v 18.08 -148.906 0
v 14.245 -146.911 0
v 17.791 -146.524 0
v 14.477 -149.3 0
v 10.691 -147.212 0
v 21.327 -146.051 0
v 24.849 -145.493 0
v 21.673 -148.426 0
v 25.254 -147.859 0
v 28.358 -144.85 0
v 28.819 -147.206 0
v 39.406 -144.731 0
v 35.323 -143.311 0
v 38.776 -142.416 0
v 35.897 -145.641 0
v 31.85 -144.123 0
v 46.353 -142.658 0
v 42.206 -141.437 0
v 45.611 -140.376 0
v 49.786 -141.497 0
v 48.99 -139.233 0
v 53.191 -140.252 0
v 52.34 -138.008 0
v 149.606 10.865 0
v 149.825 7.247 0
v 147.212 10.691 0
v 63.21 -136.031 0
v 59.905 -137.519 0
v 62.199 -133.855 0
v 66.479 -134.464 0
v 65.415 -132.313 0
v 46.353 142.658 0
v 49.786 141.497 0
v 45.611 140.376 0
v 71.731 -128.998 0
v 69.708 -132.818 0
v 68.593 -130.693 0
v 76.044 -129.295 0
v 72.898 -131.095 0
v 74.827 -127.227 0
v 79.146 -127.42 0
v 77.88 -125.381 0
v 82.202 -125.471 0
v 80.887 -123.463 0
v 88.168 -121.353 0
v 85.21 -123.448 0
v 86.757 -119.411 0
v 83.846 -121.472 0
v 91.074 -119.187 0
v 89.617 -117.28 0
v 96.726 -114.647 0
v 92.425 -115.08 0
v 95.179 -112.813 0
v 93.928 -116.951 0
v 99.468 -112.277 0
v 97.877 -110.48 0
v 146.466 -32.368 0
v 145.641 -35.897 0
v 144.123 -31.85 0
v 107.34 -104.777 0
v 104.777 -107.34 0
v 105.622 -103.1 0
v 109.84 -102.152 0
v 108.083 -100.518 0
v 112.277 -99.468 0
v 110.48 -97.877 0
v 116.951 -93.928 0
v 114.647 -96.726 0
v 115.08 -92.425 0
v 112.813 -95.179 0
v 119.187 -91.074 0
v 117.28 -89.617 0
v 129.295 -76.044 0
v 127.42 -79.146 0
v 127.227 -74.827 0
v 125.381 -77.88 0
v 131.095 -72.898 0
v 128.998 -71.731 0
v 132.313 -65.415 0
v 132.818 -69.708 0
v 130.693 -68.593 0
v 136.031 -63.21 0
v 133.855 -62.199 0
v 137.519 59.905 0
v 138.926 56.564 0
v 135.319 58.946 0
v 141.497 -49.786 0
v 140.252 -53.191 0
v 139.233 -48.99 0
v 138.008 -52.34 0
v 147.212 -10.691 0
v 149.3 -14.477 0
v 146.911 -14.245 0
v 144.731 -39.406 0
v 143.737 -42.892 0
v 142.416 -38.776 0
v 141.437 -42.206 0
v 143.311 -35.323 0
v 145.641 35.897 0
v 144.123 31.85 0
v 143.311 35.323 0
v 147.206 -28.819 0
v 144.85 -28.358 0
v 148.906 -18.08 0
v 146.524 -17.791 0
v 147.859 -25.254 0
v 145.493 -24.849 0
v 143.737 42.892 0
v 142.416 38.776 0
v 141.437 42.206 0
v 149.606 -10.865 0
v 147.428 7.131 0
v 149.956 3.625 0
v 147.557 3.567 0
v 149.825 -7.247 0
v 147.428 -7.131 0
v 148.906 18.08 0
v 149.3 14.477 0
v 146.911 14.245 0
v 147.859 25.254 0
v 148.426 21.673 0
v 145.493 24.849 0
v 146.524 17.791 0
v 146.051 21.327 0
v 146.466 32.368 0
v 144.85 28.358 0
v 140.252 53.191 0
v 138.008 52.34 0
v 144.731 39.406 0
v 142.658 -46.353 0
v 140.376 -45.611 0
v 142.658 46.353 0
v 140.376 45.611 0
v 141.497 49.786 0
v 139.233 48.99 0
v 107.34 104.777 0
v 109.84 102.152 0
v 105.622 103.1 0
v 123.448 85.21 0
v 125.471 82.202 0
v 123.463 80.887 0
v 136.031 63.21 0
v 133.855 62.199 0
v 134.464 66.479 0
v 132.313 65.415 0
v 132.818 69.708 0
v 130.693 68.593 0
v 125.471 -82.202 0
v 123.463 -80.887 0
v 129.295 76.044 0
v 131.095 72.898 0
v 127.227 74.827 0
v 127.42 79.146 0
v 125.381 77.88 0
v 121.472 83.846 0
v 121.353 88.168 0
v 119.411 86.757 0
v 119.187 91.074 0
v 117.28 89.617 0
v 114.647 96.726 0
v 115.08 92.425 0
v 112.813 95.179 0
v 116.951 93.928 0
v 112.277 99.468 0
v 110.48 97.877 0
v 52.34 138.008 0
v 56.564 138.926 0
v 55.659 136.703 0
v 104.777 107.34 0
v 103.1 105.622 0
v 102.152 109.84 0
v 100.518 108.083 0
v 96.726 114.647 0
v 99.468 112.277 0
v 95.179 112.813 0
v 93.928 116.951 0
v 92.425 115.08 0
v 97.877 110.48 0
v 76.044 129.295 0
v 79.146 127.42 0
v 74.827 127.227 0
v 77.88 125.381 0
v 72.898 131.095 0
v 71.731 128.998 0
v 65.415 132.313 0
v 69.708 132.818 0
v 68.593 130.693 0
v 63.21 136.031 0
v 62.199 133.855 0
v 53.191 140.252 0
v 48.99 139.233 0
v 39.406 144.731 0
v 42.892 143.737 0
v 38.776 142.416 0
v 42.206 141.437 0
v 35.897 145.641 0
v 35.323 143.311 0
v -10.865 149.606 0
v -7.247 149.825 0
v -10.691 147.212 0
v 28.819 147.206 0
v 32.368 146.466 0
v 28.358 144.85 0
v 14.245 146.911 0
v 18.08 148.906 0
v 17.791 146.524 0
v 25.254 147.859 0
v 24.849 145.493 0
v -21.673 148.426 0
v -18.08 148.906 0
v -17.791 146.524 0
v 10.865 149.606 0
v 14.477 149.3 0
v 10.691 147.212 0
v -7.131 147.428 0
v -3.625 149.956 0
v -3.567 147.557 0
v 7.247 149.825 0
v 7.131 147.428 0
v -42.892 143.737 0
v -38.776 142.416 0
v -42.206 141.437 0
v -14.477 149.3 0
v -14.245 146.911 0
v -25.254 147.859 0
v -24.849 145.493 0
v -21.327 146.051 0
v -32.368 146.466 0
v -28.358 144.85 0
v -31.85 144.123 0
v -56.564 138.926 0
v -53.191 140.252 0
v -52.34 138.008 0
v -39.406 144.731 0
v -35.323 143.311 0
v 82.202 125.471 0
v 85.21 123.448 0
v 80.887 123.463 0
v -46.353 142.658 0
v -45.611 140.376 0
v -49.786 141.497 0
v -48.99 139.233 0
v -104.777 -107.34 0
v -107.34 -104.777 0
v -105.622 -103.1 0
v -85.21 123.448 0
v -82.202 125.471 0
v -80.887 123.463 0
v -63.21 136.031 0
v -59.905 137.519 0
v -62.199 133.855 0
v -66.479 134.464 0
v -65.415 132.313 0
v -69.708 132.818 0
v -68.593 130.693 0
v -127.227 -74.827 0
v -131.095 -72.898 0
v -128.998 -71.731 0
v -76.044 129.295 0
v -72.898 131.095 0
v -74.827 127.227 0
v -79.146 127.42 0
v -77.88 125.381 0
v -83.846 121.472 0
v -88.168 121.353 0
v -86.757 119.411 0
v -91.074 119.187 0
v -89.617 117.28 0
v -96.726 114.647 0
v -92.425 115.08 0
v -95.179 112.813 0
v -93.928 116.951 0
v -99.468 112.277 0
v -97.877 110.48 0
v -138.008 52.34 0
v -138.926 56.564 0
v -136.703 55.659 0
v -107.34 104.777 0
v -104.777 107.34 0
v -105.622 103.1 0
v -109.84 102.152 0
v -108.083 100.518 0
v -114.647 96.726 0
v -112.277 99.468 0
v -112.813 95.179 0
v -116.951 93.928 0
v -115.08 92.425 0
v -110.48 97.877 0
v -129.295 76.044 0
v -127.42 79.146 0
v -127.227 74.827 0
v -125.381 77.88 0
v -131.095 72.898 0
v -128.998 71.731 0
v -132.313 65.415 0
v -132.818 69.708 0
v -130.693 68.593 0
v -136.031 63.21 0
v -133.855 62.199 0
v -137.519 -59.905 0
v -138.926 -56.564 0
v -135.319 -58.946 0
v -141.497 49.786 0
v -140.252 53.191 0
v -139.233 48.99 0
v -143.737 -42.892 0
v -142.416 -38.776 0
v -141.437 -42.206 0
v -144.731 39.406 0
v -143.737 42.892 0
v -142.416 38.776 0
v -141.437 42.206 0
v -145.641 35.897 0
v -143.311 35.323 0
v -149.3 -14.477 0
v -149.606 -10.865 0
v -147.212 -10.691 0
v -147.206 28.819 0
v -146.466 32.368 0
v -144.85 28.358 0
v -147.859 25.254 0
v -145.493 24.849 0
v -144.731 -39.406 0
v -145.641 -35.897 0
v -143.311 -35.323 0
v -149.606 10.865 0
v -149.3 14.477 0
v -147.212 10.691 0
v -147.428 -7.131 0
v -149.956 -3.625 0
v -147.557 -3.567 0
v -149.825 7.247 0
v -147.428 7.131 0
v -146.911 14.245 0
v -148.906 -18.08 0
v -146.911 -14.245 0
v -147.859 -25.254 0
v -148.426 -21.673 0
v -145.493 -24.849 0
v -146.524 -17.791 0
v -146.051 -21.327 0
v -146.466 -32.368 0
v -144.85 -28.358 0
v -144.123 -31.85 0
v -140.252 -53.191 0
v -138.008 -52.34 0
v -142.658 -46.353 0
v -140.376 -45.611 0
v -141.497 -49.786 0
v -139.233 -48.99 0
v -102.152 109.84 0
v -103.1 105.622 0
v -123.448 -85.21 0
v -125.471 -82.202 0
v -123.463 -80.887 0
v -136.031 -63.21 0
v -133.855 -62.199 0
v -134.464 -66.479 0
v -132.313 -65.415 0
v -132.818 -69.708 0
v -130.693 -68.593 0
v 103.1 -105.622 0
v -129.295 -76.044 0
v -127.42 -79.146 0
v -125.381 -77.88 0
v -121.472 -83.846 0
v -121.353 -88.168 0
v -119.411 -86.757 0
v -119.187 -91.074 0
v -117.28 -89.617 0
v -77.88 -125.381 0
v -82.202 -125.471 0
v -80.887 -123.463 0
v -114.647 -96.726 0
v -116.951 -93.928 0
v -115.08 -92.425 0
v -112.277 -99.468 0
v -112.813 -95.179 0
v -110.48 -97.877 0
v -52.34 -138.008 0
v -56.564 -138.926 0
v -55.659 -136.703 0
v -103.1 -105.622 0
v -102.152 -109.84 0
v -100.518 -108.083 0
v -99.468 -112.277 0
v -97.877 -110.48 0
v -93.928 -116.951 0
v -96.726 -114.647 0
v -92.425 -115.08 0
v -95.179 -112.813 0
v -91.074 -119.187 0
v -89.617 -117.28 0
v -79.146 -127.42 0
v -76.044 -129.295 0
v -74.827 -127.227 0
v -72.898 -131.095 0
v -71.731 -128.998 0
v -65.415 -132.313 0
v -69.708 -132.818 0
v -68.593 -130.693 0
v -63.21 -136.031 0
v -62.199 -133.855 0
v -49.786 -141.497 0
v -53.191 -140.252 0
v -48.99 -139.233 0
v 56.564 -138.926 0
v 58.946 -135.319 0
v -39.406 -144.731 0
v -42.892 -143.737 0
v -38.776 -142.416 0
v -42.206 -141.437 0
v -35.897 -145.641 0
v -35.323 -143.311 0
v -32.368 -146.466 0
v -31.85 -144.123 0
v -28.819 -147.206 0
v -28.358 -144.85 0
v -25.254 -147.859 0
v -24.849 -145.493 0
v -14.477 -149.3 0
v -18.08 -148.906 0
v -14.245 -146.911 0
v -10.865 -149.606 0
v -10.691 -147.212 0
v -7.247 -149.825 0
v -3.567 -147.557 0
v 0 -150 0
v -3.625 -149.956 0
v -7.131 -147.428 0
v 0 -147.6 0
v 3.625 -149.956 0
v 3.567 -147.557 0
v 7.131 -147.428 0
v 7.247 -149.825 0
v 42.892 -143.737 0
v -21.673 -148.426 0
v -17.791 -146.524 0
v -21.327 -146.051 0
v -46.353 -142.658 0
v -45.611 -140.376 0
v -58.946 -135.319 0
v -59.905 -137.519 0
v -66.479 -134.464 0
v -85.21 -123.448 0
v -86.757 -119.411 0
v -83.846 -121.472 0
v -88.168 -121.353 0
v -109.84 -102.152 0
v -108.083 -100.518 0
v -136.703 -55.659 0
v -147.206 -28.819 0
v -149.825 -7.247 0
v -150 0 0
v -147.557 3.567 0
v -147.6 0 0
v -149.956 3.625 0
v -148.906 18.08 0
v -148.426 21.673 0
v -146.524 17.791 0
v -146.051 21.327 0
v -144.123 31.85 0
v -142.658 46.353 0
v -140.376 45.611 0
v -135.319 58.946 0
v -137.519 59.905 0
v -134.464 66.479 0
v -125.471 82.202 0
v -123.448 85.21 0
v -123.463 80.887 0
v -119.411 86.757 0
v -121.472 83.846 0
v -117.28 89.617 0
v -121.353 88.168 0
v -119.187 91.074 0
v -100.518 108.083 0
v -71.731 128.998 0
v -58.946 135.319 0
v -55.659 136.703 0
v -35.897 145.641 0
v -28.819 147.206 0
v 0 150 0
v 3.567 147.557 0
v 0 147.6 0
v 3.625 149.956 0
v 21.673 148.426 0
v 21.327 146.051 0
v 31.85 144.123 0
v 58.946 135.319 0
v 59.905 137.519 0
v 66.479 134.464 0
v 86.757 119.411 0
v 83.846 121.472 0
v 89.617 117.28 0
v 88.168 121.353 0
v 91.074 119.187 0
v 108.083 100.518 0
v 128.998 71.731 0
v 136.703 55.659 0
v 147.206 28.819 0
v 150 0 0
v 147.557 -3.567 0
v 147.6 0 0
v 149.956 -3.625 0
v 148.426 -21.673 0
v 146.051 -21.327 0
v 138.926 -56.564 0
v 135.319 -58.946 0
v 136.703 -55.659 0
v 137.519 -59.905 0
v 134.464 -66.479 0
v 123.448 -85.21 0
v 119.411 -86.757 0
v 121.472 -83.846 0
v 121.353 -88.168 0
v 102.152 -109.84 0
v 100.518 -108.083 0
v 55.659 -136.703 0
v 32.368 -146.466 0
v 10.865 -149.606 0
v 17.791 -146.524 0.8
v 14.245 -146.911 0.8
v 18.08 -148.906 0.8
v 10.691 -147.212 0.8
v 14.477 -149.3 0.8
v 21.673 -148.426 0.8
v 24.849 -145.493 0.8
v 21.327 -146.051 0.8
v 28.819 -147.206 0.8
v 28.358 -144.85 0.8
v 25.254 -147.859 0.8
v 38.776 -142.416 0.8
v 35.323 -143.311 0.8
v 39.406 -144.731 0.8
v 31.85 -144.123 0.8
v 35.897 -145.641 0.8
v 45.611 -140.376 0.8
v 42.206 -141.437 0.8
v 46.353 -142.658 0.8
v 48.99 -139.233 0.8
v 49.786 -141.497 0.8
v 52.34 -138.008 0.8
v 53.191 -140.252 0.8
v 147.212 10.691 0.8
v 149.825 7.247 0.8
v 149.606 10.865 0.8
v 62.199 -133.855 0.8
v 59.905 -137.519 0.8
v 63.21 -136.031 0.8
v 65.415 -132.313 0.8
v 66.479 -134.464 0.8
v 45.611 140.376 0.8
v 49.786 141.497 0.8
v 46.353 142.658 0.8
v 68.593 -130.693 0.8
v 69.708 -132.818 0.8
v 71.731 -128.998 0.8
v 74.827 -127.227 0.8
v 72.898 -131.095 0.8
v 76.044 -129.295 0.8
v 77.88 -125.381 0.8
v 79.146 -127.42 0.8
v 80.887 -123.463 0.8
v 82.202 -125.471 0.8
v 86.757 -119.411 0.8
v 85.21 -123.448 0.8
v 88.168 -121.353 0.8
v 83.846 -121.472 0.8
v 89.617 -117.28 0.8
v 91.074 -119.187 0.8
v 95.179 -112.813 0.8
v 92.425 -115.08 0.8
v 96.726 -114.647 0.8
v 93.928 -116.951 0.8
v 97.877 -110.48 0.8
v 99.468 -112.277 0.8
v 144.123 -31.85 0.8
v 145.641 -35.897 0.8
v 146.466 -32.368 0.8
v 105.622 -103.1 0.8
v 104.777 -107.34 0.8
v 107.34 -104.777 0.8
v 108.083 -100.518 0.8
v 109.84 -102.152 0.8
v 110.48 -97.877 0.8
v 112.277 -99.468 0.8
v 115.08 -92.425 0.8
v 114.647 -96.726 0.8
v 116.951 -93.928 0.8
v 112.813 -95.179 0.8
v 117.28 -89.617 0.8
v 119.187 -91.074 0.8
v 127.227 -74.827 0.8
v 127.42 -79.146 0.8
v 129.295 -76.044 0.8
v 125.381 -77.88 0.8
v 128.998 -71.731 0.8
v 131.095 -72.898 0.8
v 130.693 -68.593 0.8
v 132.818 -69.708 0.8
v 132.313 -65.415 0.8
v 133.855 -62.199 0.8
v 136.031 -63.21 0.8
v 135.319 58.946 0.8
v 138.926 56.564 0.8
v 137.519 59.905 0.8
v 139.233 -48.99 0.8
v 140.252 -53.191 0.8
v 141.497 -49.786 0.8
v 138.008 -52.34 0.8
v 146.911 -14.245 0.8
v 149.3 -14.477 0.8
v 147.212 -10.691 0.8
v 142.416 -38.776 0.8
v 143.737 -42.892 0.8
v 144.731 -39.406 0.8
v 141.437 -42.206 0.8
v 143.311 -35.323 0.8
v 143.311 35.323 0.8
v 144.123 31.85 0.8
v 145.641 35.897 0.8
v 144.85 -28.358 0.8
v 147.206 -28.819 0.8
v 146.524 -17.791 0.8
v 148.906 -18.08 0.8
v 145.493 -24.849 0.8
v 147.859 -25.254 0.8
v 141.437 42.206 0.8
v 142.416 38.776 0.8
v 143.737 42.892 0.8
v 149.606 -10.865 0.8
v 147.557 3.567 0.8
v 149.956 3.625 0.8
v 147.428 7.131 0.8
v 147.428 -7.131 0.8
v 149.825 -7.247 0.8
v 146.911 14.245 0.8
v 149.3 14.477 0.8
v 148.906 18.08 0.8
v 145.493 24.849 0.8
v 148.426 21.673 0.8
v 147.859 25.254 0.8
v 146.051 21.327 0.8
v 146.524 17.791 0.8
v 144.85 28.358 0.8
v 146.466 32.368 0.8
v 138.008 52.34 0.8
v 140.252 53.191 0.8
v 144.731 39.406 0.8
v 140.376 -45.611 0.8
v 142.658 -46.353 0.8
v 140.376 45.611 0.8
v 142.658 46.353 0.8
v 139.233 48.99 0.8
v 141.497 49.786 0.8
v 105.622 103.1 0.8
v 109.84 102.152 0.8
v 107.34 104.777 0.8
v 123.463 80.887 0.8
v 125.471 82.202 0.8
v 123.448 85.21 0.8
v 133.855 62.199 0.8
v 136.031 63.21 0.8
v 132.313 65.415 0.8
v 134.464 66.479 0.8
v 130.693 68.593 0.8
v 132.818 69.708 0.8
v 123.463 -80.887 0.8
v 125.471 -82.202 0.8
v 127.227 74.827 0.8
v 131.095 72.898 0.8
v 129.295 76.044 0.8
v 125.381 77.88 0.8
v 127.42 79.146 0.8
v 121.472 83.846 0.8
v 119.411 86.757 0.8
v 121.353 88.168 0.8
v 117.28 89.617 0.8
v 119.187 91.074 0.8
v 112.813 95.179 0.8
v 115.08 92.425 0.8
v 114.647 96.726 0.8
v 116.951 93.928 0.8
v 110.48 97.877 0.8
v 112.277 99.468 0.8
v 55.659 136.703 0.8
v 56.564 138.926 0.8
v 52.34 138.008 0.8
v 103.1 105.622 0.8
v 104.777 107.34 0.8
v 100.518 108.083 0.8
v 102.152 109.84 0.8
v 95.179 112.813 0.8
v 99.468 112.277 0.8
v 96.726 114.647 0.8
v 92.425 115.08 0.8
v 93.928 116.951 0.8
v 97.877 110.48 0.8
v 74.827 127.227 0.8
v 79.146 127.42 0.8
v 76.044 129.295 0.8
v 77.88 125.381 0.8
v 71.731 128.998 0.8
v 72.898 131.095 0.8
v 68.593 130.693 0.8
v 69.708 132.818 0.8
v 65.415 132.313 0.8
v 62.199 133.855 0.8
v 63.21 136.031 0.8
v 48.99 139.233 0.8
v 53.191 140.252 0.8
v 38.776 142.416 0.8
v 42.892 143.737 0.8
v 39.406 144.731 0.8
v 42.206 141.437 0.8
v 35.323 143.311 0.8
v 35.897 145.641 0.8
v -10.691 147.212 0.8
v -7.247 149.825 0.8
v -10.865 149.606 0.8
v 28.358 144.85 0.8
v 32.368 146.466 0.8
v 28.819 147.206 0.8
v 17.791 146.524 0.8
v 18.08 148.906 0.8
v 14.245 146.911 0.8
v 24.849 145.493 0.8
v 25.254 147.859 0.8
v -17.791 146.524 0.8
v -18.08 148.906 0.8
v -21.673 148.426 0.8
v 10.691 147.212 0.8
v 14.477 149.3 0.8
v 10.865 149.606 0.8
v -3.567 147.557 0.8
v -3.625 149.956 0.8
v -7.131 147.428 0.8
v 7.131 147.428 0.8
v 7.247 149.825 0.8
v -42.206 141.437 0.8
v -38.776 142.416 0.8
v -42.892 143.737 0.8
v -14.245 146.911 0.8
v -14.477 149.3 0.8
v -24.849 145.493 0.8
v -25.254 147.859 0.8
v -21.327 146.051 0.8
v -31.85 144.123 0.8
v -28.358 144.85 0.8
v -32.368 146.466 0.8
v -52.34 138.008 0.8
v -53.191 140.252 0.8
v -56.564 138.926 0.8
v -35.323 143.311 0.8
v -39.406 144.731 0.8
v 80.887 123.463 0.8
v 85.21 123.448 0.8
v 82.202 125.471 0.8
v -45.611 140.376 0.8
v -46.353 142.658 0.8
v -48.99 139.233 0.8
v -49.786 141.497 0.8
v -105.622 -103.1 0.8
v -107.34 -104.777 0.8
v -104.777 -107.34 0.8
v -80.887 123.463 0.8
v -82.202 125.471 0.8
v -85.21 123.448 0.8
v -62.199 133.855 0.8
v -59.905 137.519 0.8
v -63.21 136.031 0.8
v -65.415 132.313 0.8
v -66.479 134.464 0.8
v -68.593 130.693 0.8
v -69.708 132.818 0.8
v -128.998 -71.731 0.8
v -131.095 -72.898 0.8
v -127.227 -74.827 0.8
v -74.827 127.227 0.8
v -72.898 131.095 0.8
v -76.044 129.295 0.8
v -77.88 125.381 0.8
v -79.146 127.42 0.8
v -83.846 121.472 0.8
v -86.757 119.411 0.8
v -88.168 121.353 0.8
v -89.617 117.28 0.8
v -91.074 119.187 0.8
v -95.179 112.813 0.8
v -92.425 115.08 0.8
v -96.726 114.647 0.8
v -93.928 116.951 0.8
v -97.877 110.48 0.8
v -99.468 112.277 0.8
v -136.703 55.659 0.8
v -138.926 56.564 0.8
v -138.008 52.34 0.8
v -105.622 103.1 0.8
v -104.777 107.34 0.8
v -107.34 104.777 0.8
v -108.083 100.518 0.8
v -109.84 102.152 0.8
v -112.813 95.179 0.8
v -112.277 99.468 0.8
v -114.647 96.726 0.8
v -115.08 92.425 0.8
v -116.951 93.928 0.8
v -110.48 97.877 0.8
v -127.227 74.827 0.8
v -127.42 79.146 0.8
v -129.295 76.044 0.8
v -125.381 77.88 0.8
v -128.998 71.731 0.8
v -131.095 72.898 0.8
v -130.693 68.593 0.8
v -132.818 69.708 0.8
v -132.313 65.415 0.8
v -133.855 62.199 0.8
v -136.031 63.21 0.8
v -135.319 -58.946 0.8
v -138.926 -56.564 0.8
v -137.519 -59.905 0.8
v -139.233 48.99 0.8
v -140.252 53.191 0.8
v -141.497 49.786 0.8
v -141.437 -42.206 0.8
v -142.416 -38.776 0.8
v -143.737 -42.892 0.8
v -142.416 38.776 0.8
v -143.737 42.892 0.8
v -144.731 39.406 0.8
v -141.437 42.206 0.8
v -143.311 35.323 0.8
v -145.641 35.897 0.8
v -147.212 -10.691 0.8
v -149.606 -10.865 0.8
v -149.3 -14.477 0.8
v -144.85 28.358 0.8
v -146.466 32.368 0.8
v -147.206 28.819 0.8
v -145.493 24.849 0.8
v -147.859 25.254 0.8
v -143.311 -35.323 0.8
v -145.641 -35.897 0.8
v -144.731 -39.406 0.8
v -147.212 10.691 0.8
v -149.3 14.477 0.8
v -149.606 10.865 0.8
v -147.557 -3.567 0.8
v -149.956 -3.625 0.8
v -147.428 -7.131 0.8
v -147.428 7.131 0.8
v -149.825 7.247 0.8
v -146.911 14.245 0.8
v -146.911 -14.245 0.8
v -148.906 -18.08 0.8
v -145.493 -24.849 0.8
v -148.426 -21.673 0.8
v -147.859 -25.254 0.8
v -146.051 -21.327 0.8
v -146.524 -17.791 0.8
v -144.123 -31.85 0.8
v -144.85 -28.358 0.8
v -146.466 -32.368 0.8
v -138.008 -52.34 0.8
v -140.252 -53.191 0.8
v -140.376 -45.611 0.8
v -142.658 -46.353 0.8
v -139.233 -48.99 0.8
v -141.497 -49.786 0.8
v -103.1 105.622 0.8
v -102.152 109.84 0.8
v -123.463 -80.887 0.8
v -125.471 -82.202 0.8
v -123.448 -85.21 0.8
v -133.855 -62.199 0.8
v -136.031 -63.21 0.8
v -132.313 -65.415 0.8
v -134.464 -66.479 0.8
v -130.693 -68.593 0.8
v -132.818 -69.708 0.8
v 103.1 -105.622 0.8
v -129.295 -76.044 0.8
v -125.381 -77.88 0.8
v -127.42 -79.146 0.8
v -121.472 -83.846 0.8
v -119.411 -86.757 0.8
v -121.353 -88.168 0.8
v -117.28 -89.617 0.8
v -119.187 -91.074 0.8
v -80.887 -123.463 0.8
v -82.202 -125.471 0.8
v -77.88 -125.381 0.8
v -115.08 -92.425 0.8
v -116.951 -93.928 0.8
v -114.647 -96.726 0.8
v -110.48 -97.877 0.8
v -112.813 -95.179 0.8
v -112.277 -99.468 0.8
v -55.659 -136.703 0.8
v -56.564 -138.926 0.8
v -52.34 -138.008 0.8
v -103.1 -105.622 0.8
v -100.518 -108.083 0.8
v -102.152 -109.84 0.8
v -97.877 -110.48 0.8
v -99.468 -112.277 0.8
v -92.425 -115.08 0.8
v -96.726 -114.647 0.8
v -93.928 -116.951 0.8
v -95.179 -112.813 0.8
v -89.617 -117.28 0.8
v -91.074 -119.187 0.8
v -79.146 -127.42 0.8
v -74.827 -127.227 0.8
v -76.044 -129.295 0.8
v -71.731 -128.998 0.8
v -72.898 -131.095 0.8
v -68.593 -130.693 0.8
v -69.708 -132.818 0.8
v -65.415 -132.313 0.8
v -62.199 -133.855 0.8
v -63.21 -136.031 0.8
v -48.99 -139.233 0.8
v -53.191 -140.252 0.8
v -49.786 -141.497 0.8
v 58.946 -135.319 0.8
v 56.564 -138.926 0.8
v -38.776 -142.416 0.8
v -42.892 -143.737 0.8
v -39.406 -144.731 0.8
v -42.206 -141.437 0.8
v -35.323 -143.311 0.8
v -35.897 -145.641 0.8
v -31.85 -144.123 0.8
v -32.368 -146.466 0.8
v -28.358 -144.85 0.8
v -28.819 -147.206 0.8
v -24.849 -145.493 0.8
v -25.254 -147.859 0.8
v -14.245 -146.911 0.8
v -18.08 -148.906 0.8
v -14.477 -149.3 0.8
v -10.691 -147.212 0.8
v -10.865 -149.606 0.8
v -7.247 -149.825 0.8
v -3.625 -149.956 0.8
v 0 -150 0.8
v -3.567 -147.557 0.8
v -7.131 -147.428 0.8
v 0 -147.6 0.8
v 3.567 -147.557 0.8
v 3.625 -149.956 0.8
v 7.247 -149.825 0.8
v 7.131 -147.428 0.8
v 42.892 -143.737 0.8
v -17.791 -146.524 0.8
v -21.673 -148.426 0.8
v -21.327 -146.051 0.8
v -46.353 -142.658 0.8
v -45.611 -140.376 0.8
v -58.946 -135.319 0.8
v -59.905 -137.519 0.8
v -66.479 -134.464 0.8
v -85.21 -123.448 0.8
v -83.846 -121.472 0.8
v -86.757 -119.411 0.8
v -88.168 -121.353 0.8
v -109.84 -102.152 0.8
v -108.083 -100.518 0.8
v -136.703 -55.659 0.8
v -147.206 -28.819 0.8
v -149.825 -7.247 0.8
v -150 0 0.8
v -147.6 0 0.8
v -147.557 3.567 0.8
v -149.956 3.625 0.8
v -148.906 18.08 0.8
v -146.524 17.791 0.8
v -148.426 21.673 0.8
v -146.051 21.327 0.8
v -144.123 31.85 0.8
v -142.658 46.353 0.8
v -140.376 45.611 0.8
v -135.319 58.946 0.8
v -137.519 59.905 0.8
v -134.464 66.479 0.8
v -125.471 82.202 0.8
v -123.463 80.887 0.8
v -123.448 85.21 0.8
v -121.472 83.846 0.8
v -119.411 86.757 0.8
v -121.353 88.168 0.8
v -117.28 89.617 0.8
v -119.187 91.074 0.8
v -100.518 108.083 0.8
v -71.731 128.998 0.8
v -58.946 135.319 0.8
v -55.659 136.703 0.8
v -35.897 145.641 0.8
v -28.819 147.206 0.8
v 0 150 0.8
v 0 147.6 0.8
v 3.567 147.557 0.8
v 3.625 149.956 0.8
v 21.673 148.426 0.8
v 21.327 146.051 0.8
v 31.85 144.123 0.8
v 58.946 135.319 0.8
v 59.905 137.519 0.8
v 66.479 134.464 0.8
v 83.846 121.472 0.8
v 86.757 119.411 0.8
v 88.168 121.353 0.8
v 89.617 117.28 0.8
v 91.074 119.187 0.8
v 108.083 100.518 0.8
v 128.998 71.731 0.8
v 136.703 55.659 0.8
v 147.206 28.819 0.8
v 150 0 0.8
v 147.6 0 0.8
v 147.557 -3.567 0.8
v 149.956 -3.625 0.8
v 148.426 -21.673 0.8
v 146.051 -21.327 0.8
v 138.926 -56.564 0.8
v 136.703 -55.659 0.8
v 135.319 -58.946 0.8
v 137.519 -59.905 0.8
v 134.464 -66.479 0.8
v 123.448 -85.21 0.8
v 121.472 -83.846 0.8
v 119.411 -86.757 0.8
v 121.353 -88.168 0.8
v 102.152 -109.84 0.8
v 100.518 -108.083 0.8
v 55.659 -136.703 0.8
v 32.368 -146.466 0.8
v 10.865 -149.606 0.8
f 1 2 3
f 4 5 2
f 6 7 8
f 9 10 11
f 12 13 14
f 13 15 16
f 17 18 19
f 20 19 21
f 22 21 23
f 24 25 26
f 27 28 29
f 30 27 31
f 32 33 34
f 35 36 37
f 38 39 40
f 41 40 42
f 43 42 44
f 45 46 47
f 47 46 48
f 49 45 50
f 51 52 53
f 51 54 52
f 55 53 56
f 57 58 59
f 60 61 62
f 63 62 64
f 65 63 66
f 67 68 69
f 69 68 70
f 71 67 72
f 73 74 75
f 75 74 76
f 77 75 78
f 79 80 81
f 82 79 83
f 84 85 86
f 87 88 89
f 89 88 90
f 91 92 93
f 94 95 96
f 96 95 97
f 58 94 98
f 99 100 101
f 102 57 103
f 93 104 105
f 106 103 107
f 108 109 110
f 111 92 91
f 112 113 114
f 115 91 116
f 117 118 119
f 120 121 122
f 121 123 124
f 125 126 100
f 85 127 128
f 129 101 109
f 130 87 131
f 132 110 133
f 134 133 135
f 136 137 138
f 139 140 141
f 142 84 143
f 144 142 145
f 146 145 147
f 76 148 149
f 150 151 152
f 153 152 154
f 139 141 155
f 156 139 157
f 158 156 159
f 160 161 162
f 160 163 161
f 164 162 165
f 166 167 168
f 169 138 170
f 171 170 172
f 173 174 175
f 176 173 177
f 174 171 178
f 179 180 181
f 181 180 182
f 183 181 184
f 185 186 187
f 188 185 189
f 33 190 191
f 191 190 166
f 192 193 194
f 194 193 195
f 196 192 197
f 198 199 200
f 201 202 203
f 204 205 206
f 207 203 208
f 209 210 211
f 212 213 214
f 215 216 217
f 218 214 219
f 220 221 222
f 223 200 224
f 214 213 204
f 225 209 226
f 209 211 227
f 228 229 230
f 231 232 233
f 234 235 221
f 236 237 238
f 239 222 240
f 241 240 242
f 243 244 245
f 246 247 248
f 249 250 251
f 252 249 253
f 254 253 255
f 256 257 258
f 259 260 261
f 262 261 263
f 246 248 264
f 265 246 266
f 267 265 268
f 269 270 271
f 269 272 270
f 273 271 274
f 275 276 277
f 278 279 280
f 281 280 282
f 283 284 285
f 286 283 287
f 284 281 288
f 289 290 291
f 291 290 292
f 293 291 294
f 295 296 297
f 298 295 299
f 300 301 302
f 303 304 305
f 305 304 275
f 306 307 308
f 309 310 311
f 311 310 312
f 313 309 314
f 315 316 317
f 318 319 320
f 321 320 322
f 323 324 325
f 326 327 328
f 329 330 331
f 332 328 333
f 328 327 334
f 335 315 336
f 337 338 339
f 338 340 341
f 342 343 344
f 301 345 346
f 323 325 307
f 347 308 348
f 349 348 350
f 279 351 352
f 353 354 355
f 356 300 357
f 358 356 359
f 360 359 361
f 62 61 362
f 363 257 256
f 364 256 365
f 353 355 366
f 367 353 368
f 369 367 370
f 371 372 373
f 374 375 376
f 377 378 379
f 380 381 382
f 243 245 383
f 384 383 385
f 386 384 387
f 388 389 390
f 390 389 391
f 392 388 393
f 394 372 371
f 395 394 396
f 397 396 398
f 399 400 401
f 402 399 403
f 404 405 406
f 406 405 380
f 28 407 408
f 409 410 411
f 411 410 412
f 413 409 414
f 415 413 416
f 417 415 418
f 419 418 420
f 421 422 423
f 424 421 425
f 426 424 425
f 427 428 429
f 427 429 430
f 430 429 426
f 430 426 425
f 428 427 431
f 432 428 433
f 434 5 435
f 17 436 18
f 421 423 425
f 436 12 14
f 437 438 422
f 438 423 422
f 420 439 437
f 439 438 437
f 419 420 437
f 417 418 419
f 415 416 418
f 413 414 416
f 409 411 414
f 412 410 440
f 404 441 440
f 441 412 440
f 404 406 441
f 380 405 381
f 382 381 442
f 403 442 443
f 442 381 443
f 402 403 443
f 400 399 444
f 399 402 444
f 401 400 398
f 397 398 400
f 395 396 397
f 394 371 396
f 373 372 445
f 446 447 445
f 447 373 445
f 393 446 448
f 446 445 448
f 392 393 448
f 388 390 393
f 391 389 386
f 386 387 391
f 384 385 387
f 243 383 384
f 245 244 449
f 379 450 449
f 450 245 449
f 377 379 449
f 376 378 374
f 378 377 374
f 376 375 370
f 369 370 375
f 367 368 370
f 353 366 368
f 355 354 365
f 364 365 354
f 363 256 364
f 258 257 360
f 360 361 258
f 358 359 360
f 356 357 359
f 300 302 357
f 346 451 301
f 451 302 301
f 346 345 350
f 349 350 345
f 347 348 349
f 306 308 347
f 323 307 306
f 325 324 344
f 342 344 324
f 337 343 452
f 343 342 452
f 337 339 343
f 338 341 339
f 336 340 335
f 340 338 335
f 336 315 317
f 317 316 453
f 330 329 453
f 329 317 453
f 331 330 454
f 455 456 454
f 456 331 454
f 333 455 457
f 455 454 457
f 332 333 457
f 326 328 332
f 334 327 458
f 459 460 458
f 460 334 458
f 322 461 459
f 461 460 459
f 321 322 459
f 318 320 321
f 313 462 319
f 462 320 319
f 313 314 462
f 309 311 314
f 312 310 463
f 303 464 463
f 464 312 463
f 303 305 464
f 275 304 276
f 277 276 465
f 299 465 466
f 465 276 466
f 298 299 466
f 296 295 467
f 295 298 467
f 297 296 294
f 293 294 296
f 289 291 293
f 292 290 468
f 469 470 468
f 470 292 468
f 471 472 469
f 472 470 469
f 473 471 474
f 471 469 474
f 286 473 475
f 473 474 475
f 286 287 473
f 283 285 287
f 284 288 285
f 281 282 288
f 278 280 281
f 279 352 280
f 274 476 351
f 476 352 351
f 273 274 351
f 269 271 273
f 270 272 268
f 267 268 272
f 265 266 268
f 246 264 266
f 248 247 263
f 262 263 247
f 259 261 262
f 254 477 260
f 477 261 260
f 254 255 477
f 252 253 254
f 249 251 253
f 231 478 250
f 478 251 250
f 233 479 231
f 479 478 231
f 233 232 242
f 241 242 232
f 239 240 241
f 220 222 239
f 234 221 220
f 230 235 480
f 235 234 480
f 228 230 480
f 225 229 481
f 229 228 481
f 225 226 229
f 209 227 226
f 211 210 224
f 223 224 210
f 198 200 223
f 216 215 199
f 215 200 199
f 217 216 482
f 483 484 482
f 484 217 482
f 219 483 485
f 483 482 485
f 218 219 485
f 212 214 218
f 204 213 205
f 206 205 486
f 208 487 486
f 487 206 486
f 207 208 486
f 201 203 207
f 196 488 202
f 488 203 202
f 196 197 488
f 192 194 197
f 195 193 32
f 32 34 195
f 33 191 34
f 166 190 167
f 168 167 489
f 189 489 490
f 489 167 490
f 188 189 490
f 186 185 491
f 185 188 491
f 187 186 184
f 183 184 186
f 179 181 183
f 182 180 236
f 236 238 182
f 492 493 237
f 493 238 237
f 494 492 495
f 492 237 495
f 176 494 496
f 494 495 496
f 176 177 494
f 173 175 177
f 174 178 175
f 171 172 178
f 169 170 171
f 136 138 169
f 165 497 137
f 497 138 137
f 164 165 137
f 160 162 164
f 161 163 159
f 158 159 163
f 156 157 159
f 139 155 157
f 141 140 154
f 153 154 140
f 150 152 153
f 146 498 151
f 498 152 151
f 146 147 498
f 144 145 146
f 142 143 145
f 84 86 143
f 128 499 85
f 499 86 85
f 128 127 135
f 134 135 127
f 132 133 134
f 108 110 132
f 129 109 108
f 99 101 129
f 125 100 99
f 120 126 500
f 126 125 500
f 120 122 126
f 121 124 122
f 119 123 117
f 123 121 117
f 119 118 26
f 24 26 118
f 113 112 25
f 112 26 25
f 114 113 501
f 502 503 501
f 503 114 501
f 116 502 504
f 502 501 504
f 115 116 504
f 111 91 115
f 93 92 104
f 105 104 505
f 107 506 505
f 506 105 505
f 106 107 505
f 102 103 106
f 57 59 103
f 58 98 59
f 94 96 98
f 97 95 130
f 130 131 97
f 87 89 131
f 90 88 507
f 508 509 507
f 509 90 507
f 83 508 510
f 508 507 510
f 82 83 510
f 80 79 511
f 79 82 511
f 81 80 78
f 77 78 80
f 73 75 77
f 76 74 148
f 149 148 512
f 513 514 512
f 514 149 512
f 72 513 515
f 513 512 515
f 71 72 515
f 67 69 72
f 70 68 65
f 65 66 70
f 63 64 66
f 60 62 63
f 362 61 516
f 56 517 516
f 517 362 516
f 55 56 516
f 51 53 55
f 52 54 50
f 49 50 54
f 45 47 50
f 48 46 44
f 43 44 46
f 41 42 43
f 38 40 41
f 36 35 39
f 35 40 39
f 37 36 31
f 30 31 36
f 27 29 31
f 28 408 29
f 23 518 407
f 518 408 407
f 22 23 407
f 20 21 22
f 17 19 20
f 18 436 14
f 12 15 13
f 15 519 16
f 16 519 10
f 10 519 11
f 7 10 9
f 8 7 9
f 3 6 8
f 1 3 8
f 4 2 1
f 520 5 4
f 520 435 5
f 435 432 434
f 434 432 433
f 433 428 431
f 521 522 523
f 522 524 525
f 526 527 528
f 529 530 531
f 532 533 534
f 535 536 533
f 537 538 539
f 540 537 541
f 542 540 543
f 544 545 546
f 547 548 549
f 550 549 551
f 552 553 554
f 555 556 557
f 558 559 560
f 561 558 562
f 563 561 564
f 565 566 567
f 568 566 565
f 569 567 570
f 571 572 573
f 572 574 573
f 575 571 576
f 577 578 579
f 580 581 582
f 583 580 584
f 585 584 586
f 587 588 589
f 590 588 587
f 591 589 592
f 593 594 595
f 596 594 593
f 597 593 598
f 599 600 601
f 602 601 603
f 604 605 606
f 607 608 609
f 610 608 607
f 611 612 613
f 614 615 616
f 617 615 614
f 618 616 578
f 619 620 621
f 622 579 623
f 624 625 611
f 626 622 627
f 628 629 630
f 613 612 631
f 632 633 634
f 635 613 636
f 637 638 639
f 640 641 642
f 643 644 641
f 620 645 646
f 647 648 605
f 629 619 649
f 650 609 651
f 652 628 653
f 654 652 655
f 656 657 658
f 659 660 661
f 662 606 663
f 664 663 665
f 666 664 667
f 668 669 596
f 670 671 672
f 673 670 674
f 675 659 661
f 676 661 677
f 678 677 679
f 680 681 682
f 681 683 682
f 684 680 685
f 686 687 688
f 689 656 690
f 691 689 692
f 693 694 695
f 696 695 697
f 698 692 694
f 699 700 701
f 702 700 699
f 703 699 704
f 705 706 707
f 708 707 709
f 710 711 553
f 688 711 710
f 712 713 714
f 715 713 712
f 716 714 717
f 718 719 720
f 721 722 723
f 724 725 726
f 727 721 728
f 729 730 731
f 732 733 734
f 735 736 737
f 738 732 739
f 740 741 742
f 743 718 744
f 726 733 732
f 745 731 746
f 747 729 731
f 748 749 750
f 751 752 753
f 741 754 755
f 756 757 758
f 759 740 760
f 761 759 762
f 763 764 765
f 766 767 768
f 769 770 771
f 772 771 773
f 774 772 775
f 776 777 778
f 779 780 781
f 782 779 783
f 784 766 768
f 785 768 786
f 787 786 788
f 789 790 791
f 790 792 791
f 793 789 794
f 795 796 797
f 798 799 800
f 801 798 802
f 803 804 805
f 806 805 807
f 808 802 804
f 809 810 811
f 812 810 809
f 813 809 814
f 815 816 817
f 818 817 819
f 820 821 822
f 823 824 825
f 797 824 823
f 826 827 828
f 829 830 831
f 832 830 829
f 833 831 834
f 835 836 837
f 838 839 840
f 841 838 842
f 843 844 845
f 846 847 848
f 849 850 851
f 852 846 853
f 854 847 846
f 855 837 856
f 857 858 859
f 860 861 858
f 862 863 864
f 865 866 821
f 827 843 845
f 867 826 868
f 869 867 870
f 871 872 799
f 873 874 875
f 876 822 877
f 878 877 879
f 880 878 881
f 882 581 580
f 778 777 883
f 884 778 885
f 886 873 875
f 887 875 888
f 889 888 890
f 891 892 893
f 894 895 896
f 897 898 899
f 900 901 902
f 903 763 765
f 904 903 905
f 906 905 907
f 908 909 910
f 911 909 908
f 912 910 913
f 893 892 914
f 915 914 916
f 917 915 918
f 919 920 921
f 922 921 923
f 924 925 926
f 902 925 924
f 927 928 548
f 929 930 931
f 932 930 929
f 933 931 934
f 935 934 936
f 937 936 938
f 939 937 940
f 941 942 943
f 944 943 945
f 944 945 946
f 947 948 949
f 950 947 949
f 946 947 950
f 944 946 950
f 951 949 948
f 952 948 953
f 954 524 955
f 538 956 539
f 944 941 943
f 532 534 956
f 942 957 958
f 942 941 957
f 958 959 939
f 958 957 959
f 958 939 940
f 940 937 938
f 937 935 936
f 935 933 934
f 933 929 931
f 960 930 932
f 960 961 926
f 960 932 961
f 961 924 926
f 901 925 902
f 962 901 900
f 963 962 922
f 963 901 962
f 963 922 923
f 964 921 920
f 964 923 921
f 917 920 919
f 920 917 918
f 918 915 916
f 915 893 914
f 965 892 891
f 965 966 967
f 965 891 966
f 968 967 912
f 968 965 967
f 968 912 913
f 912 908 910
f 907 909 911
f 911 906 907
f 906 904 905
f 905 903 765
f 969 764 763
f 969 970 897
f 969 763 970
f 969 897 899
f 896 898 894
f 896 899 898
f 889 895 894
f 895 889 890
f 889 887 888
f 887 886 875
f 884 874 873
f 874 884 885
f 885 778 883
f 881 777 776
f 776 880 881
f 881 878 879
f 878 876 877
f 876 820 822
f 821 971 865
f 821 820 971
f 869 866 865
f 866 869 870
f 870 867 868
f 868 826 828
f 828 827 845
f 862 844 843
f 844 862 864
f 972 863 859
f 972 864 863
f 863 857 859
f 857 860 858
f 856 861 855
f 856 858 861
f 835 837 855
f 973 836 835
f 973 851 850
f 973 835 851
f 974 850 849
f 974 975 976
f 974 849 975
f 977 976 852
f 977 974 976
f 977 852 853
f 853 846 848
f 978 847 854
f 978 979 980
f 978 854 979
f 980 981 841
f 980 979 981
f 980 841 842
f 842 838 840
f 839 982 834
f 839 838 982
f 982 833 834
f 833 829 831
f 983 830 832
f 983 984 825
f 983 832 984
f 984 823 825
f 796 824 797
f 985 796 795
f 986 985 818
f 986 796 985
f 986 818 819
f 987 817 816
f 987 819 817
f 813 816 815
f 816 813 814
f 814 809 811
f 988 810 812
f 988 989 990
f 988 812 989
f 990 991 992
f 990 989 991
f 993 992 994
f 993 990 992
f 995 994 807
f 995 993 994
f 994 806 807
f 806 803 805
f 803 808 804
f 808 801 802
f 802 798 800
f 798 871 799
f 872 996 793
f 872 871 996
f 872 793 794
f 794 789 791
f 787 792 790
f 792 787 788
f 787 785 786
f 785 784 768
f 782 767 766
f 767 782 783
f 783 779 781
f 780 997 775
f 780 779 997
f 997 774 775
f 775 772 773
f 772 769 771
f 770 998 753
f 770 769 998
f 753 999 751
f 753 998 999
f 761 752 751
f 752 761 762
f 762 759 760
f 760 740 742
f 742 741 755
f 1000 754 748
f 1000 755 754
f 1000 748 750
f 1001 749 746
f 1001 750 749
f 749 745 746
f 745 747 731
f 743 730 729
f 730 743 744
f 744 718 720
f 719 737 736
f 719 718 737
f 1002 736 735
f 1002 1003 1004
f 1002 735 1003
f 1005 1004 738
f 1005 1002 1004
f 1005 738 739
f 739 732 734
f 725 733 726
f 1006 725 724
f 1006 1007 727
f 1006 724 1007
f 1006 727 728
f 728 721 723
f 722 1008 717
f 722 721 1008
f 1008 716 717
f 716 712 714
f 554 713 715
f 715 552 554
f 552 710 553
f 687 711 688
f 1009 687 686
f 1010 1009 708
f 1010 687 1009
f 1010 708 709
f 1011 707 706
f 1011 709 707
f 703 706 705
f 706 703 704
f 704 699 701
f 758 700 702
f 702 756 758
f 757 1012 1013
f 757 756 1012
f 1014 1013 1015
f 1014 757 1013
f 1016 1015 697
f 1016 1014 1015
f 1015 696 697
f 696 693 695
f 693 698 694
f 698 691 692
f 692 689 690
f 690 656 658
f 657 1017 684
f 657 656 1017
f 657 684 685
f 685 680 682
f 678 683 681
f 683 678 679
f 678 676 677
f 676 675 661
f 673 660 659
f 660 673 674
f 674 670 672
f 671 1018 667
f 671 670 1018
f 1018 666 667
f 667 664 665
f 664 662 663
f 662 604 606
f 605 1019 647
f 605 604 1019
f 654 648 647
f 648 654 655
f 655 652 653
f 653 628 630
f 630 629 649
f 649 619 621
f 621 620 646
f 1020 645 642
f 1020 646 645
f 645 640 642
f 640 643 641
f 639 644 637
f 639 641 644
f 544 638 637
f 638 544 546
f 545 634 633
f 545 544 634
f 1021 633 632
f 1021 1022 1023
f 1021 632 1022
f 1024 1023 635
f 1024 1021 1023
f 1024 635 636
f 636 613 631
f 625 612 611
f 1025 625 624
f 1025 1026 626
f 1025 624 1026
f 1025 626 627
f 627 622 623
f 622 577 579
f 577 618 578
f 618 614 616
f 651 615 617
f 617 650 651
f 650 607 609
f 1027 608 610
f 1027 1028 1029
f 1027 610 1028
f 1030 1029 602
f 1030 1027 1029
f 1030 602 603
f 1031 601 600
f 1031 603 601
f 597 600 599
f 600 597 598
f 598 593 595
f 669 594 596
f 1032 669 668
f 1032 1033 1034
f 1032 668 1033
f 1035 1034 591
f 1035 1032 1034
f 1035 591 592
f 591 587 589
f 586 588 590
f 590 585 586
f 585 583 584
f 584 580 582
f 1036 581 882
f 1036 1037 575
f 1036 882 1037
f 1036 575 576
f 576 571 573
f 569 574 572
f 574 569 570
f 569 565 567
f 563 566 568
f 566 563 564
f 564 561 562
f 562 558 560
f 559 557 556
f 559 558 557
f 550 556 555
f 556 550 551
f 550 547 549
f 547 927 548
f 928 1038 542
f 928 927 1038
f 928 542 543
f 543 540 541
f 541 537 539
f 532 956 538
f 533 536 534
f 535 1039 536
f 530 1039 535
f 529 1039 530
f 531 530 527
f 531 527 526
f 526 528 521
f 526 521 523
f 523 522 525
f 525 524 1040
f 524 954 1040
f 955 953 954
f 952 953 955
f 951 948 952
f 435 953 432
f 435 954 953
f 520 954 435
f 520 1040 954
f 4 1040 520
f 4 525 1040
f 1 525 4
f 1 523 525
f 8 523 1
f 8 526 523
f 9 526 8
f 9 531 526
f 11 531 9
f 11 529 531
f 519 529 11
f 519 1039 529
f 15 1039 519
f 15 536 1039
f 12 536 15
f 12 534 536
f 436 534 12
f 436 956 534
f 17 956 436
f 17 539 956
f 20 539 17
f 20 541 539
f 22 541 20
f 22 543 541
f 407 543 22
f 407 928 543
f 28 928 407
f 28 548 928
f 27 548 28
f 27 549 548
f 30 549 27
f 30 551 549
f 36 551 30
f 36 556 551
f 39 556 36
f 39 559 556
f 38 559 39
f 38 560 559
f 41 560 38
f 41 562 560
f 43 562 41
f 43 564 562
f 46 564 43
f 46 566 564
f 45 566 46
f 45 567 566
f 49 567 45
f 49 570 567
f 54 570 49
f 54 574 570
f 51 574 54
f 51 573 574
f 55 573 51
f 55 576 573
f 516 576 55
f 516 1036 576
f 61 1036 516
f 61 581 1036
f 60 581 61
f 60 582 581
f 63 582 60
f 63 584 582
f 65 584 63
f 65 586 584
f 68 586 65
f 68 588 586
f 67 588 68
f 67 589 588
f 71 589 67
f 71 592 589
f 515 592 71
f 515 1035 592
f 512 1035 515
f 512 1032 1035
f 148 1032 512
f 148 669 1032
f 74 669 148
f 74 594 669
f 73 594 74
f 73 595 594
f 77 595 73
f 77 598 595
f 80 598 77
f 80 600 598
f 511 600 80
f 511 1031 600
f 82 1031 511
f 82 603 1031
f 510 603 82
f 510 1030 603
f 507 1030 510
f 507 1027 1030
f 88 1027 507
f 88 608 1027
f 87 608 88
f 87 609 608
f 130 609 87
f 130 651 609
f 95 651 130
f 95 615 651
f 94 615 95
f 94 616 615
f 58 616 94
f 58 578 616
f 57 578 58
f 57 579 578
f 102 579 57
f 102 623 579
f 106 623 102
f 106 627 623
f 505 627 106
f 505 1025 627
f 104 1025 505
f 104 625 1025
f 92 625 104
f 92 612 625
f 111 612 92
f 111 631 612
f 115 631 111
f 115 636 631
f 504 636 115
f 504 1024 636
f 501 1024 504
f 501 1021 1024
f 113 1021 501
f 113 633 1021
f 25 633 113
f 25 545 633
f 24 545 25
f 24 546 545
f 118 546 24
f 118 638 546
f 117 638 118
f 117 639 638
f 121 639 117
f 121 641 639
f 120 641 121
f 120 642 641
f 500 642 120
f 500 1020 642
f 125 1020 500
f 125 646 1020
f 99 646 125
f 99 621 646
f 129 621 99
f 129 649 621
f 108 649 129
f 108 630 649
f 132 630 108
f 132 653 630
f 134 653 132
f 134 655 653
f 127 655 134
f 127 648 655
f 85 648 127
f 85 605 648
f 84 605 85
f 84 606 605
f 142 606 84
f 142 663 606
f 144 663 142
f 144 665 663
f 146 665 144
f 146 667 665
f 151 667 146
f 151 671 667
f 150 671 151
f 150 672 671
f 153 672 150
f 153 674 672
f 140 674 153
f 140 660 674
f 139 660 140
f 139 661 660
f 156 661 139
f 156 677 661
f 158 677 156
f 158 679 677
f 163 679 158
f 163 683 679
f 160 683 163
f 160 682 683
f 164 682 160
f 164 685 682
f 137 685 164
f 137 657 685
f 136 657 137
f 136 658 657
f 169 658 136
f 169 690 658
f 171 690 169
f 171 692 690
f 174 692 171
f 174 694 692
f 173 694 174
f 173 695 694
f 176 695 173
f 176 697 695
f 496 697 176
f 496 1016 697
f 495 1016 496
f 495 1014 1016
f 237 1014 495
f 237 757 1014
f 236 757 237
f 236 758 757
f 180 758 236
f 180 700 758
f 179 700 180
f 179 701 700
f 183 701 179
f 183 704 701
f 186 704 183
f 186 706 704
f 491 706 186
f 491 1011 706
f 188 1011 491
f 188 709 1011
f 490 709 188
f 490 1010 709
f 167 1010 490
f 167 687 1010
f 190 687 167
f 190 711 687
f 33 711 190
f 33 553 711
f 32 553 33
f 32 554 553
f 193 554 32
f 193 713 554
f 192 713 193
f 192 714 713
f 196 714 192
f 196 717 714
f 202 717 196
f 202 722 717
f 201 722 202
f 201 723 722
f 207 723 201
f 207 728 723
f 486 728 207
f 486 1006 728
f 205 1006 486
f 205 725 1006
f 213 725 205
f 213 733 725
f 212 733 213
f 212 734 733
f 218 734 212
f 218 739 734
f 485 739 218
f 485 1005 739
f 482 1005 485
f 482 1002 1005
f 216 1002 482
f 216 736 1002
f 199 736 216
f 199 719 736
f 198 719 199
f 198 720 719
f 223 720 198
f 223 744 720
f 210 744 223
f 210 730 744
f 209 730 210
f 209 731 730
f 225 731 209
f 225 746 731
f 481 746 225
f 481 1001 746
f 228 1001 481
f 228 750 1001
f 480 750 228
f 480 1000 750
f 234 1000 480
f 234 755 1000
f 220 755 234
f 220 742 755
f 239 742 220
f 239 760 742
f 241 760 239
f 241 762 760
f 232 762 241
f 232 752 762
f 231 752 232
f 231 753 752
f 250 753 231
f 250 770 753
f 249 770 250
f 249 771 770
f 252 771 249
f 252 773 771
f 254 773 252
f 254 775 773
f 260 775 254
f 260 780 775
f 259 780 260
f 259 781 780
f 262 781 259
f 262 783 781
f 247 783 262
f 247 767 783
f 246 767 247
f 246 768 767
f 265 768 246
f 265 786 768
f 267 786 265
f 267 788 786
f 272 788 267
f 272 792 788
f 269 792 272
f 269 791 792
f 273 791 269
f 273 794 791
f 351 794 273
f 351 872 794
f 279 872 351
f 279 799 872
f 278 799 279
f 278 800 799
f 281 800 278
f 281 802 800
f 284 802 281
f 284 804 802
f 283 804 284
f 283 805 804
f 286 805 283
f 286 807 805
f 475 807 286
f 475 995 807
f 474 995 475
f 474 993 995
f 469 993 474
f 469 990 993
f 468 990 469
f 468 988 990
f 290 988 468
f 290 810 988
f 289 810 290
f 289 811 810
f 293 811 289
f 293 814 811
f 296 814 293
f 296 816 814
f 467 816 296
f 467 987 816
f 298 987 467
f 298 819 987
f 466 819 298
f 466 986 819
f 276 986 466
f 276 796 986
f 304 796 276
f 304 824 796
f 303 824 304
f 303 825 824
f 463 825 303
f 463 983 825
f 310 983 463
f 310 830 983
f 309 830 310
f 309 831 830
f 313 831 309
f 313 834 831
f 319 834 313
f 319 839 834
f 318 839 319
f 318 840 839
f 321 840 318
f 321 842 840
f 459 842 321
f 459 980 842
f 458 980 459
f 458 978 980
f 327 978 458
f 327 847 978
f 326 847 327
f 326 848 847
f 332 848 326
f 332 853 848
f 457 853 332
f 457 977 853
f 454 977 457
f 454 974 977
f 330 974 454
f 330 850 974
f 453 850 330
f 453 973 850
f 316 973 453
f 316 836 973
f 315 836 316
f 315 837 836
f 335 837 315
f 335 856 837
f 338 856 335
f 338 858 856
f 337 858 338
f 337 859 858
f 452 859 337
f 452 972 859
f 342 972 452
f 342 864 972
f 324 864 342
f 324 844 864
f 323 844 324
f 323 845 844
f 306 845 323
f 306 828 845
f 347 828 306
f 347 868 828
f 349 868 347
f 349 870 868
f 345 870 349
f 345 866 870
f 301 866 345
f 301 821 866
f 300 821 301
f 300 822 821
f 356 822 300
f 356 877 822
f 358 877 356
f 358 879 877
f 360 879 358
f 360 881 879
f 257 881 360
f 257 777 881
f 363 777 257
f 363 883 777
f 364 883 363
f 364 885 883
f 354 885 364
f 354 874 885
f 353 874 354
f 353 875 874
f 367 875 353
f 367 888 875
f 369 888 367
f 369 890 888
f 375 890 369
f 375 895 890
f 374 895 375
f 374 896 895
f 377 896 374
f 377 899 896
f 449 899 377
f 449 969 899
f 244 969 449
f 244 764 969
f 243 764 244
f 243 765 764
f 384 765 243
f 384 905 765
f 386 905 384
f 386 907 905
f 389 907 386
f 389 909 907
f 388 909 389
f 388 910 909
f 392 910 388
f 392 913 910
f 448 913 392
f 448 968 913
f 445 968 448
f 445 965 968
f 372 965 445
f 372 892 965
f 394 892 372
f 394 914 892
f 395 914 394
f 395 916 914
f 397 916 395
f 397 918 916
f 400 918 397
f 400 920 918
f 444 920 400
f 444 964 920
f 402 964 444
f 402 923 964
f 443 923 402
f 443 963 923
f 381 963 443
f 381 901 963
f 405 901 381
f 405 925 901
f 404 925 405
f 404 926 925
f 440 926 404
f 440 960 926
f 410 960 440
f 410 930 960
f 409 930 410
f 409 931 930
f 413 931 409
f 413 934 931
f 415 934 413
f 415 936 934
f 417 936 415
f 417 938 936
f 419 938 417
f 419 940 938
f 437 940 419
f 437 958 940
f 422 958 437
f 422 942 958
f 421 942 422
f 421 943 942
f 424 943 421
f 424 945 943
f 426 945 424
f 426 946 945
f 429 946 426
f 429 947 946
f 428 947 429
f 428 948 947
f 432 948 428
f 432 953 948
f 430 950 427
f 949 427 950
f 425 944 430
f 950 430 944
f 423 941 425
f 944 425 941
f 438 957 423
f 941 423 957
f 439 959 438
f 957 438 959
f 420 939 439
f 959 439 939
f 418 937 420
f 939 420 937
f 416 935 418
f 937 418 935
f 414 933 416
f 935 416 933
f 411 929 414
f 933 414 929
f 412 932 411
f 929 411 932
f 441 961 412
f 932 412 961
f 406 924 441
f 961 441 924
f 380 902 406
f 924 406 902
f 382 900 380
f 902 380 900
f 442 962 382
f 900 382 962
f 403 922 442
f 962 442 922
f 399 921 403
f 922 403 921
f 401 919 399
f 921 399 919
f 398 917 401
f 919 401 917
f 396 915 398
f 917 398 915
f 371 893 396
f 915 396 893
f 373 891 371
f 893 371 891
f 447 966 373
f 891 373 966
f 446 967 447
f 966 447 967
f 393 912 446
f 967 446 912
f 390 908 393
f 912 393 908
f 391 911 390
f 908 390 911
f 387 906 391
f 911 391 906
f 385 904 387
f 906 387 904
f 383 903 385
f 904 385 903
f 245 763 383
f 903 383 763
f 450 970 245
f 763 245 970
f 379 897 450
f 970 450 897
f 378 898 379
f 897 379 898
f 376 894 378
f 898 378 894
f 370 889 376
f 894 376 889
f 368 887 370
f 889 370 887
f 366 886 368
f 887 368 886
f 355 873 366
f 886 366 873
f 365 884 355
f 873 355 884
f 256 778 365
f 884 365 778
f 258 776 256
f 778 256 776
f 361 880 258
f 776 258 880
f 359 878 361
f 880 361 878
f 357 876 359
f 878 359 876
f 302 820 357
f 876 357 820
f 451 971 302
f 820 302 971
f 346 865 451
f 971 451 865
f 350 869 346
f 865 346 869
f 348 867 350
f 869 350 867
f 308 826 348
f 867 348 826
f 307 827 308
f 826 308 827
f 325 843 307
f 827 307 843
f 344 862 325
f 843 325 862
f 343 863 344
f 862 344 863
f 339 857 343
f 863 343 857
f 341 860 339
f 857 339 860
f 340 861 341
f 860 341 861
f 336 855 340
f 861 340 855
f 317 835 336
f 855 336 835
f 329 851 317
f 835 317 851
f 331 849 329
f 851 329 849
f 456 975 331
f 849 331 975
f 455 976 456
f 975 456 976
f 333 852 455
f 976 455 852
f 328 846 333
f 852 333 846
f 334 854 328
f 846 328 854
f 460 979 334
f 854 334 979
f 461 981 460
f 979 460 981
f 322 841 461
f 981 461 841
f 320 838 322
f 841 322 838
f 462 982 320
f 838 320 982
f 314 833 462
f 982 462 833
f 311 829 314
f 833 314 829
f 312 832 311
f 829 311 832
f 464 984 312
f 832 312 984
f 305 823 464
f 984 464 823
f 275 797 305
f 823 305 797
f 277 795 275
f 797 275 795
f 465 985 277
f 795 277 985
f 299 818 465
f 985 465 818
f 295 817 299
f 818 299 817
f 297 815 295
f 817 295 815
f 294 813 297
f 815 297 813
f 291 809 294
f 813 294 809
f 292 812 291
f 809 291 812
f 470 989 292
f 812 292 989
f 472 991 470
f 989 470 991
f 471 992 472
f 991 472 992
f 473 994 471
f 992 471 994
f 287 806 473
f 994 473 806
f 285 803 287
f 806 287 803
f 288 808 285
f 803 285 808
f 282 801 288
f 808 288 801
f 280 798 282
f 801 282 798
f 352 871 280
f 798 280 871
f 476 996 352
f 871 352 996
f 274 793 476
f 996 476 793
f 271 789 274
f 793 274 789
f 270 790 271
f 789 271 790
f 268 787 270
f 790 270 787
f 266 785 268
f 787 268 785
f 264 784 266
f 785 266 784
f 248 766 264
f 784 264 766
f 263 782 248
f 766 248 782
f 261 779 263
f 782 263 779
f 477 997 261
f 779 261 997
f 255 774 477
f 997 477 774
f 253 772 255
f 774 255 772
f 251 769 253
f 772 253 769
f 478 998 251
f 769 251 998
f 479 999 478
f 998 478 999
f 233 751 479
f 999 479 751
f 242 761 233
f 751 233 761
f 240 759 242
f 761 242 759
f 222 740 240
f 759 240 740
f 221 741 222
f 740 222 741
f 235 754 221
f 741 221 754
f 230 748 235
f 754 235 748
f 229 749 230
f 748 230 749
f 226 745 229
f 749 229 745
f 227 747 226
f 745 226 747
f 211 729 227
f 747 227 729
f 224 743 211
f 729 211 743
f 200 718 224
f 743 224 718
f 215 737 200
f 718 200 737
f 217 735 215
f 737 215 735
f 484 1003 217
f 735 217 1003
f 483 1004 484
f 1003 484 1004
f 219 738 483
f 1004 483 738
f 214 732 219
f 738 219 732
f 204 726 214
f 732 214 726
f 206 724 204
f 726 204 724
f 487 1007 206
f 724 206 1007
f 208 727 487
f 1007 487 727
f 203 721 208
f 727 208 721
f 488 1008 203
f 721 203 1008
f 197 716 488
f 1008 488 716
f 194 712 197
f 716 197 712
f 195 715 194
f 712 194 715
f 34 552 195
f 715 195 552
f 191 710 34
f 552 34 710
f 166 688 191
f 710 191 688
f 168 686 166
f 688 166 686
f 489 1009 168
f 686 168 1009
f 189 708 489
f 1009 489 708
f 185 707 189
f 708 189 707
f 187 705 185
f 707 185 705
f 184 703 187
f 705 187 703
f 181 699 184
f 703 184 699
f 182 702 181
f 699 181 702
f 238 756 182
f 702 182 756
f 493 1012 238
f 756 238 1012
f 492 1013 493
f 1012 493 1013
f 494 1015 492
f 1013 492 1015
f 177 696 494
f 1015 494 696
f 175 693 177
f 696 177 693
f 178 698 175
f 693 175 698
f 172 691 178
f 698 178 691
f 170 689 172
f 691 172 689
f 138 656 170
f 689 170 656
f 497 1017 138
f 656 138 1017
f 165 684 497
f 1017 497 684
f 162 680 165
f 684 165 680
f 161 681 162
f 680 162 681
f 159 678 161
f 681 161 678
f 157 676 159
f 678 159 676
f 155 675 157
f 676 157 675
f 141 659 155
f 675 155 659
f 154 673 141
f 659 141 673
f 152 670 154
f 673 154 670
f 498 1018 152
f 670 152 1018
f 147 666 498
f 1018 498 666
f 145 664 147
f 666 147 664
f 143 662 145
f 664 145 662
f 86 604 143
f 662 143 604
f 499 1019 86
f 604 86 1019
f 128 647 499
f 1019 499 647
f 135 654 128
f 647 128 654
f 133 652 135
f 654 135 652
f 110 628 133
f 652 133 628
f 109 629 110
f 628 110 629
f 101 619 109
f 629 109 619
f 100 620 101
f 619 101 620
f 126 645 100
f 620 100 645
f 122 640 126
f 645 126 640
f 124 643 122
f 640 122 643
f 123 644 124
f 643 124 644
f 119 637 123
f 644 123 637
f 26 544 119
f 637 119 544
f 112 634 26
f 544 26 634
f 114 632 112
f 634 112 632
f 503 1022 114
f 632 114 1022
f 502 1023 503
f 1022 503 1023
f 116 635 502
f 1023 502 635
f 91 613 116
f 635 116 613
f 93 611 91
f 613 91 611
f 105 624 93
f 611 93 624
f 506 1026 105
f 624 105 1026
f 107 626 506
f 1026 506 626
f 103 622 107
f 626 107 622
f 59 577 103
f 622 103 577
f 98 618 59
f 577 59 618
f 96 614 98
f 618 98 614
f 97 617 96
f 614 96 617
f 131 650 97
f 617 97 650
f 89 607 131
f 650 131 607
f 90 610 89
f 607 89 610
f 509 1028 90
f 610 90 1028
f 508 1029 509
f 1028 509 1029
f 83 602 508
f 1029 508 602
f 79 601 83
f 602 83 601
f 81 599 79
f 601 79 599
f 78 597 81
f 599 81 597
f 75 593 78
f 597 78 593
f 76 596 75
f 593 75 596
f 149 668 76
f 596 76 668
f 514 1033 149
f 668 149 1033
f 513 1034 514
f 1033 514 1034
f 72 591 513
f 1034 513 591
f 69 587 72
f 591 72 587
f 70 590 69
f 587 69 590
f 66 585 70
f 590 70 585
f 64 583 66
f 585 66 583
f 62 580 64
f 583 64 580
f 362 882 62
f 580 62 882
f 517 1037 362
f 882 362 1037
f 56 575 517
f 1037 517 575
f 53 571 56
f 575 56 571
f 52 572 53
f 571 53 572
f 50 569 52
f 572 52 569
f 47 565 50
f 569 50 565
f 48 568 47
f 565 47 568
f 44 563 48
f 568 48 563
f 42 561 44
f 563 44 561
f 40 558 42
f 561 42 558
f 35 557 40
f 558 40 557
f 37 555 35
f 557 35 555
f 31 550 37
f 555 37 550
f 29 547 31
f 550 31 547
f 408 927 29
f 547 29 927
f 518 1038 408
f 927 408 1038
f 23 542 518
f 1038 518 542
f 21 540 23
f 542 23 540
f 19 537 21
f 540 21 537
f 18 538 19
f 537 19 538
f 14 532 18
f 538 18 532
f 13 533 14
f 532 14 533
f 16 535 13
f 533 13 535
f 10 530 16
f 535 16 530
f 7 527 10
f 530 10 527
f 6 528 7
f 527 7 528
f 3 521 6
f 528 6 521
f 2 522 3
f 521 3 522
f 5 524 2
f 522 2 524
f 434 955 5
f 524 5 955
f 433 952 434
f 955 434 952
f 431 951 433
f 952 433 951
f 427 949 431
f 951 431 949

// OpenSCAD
PadOD = 300;

LayerHeight = 0.4;
NozzleWidth = 0.8;
LineCount = 6;
PadWidth = NozzleWidth * LineCount;

PadHeight = 0.8;
// PadWidth = 20;
PrintBedX = 190 - PadWidth - PadOD;
printBedY = 190 - PadWidth - PadOD;
xFactor = [0,1,-1,1,-1];
yFactor = [0,1,1,-1,-1];
// function xFactor(i) = lookup(i, [0,1,-1,1,-1]);
// function yFactor(i) = lookup(i, [0,1,1,-1,-1]);
$fn = 260;

Build("single");
module Build(arg)
{
    if(arg == "single")
    {
        PadCreate(PadOD, PadOD - PadWidth, PadHeight, 0, 0);
    }
    else
    {
        PrintBedLevelingCircles();
    }
}

module PrintBedLevelingCircles()
{
    for (i=[0:4]) 
    {
        echo(i=i, x=xFactor[i], y= yFactor[i]);
        PadCreate(PadOD, id = 0, PadHeight, xFactor[i] * PrintBedX, yFactor[i] * printBedY);
    }
}

module PadCreate(od, id = 0, height, x=0, y=0, z=0) 
{
    echo("PadCreate", dia=od, height=height, x=x, y=y, z=z);
    translate([ x, y, z]) {
        linear_extrude(height =height)
        difference()
        {
            circle(d=od);        
            circle(d = id);

        }
    }
}
